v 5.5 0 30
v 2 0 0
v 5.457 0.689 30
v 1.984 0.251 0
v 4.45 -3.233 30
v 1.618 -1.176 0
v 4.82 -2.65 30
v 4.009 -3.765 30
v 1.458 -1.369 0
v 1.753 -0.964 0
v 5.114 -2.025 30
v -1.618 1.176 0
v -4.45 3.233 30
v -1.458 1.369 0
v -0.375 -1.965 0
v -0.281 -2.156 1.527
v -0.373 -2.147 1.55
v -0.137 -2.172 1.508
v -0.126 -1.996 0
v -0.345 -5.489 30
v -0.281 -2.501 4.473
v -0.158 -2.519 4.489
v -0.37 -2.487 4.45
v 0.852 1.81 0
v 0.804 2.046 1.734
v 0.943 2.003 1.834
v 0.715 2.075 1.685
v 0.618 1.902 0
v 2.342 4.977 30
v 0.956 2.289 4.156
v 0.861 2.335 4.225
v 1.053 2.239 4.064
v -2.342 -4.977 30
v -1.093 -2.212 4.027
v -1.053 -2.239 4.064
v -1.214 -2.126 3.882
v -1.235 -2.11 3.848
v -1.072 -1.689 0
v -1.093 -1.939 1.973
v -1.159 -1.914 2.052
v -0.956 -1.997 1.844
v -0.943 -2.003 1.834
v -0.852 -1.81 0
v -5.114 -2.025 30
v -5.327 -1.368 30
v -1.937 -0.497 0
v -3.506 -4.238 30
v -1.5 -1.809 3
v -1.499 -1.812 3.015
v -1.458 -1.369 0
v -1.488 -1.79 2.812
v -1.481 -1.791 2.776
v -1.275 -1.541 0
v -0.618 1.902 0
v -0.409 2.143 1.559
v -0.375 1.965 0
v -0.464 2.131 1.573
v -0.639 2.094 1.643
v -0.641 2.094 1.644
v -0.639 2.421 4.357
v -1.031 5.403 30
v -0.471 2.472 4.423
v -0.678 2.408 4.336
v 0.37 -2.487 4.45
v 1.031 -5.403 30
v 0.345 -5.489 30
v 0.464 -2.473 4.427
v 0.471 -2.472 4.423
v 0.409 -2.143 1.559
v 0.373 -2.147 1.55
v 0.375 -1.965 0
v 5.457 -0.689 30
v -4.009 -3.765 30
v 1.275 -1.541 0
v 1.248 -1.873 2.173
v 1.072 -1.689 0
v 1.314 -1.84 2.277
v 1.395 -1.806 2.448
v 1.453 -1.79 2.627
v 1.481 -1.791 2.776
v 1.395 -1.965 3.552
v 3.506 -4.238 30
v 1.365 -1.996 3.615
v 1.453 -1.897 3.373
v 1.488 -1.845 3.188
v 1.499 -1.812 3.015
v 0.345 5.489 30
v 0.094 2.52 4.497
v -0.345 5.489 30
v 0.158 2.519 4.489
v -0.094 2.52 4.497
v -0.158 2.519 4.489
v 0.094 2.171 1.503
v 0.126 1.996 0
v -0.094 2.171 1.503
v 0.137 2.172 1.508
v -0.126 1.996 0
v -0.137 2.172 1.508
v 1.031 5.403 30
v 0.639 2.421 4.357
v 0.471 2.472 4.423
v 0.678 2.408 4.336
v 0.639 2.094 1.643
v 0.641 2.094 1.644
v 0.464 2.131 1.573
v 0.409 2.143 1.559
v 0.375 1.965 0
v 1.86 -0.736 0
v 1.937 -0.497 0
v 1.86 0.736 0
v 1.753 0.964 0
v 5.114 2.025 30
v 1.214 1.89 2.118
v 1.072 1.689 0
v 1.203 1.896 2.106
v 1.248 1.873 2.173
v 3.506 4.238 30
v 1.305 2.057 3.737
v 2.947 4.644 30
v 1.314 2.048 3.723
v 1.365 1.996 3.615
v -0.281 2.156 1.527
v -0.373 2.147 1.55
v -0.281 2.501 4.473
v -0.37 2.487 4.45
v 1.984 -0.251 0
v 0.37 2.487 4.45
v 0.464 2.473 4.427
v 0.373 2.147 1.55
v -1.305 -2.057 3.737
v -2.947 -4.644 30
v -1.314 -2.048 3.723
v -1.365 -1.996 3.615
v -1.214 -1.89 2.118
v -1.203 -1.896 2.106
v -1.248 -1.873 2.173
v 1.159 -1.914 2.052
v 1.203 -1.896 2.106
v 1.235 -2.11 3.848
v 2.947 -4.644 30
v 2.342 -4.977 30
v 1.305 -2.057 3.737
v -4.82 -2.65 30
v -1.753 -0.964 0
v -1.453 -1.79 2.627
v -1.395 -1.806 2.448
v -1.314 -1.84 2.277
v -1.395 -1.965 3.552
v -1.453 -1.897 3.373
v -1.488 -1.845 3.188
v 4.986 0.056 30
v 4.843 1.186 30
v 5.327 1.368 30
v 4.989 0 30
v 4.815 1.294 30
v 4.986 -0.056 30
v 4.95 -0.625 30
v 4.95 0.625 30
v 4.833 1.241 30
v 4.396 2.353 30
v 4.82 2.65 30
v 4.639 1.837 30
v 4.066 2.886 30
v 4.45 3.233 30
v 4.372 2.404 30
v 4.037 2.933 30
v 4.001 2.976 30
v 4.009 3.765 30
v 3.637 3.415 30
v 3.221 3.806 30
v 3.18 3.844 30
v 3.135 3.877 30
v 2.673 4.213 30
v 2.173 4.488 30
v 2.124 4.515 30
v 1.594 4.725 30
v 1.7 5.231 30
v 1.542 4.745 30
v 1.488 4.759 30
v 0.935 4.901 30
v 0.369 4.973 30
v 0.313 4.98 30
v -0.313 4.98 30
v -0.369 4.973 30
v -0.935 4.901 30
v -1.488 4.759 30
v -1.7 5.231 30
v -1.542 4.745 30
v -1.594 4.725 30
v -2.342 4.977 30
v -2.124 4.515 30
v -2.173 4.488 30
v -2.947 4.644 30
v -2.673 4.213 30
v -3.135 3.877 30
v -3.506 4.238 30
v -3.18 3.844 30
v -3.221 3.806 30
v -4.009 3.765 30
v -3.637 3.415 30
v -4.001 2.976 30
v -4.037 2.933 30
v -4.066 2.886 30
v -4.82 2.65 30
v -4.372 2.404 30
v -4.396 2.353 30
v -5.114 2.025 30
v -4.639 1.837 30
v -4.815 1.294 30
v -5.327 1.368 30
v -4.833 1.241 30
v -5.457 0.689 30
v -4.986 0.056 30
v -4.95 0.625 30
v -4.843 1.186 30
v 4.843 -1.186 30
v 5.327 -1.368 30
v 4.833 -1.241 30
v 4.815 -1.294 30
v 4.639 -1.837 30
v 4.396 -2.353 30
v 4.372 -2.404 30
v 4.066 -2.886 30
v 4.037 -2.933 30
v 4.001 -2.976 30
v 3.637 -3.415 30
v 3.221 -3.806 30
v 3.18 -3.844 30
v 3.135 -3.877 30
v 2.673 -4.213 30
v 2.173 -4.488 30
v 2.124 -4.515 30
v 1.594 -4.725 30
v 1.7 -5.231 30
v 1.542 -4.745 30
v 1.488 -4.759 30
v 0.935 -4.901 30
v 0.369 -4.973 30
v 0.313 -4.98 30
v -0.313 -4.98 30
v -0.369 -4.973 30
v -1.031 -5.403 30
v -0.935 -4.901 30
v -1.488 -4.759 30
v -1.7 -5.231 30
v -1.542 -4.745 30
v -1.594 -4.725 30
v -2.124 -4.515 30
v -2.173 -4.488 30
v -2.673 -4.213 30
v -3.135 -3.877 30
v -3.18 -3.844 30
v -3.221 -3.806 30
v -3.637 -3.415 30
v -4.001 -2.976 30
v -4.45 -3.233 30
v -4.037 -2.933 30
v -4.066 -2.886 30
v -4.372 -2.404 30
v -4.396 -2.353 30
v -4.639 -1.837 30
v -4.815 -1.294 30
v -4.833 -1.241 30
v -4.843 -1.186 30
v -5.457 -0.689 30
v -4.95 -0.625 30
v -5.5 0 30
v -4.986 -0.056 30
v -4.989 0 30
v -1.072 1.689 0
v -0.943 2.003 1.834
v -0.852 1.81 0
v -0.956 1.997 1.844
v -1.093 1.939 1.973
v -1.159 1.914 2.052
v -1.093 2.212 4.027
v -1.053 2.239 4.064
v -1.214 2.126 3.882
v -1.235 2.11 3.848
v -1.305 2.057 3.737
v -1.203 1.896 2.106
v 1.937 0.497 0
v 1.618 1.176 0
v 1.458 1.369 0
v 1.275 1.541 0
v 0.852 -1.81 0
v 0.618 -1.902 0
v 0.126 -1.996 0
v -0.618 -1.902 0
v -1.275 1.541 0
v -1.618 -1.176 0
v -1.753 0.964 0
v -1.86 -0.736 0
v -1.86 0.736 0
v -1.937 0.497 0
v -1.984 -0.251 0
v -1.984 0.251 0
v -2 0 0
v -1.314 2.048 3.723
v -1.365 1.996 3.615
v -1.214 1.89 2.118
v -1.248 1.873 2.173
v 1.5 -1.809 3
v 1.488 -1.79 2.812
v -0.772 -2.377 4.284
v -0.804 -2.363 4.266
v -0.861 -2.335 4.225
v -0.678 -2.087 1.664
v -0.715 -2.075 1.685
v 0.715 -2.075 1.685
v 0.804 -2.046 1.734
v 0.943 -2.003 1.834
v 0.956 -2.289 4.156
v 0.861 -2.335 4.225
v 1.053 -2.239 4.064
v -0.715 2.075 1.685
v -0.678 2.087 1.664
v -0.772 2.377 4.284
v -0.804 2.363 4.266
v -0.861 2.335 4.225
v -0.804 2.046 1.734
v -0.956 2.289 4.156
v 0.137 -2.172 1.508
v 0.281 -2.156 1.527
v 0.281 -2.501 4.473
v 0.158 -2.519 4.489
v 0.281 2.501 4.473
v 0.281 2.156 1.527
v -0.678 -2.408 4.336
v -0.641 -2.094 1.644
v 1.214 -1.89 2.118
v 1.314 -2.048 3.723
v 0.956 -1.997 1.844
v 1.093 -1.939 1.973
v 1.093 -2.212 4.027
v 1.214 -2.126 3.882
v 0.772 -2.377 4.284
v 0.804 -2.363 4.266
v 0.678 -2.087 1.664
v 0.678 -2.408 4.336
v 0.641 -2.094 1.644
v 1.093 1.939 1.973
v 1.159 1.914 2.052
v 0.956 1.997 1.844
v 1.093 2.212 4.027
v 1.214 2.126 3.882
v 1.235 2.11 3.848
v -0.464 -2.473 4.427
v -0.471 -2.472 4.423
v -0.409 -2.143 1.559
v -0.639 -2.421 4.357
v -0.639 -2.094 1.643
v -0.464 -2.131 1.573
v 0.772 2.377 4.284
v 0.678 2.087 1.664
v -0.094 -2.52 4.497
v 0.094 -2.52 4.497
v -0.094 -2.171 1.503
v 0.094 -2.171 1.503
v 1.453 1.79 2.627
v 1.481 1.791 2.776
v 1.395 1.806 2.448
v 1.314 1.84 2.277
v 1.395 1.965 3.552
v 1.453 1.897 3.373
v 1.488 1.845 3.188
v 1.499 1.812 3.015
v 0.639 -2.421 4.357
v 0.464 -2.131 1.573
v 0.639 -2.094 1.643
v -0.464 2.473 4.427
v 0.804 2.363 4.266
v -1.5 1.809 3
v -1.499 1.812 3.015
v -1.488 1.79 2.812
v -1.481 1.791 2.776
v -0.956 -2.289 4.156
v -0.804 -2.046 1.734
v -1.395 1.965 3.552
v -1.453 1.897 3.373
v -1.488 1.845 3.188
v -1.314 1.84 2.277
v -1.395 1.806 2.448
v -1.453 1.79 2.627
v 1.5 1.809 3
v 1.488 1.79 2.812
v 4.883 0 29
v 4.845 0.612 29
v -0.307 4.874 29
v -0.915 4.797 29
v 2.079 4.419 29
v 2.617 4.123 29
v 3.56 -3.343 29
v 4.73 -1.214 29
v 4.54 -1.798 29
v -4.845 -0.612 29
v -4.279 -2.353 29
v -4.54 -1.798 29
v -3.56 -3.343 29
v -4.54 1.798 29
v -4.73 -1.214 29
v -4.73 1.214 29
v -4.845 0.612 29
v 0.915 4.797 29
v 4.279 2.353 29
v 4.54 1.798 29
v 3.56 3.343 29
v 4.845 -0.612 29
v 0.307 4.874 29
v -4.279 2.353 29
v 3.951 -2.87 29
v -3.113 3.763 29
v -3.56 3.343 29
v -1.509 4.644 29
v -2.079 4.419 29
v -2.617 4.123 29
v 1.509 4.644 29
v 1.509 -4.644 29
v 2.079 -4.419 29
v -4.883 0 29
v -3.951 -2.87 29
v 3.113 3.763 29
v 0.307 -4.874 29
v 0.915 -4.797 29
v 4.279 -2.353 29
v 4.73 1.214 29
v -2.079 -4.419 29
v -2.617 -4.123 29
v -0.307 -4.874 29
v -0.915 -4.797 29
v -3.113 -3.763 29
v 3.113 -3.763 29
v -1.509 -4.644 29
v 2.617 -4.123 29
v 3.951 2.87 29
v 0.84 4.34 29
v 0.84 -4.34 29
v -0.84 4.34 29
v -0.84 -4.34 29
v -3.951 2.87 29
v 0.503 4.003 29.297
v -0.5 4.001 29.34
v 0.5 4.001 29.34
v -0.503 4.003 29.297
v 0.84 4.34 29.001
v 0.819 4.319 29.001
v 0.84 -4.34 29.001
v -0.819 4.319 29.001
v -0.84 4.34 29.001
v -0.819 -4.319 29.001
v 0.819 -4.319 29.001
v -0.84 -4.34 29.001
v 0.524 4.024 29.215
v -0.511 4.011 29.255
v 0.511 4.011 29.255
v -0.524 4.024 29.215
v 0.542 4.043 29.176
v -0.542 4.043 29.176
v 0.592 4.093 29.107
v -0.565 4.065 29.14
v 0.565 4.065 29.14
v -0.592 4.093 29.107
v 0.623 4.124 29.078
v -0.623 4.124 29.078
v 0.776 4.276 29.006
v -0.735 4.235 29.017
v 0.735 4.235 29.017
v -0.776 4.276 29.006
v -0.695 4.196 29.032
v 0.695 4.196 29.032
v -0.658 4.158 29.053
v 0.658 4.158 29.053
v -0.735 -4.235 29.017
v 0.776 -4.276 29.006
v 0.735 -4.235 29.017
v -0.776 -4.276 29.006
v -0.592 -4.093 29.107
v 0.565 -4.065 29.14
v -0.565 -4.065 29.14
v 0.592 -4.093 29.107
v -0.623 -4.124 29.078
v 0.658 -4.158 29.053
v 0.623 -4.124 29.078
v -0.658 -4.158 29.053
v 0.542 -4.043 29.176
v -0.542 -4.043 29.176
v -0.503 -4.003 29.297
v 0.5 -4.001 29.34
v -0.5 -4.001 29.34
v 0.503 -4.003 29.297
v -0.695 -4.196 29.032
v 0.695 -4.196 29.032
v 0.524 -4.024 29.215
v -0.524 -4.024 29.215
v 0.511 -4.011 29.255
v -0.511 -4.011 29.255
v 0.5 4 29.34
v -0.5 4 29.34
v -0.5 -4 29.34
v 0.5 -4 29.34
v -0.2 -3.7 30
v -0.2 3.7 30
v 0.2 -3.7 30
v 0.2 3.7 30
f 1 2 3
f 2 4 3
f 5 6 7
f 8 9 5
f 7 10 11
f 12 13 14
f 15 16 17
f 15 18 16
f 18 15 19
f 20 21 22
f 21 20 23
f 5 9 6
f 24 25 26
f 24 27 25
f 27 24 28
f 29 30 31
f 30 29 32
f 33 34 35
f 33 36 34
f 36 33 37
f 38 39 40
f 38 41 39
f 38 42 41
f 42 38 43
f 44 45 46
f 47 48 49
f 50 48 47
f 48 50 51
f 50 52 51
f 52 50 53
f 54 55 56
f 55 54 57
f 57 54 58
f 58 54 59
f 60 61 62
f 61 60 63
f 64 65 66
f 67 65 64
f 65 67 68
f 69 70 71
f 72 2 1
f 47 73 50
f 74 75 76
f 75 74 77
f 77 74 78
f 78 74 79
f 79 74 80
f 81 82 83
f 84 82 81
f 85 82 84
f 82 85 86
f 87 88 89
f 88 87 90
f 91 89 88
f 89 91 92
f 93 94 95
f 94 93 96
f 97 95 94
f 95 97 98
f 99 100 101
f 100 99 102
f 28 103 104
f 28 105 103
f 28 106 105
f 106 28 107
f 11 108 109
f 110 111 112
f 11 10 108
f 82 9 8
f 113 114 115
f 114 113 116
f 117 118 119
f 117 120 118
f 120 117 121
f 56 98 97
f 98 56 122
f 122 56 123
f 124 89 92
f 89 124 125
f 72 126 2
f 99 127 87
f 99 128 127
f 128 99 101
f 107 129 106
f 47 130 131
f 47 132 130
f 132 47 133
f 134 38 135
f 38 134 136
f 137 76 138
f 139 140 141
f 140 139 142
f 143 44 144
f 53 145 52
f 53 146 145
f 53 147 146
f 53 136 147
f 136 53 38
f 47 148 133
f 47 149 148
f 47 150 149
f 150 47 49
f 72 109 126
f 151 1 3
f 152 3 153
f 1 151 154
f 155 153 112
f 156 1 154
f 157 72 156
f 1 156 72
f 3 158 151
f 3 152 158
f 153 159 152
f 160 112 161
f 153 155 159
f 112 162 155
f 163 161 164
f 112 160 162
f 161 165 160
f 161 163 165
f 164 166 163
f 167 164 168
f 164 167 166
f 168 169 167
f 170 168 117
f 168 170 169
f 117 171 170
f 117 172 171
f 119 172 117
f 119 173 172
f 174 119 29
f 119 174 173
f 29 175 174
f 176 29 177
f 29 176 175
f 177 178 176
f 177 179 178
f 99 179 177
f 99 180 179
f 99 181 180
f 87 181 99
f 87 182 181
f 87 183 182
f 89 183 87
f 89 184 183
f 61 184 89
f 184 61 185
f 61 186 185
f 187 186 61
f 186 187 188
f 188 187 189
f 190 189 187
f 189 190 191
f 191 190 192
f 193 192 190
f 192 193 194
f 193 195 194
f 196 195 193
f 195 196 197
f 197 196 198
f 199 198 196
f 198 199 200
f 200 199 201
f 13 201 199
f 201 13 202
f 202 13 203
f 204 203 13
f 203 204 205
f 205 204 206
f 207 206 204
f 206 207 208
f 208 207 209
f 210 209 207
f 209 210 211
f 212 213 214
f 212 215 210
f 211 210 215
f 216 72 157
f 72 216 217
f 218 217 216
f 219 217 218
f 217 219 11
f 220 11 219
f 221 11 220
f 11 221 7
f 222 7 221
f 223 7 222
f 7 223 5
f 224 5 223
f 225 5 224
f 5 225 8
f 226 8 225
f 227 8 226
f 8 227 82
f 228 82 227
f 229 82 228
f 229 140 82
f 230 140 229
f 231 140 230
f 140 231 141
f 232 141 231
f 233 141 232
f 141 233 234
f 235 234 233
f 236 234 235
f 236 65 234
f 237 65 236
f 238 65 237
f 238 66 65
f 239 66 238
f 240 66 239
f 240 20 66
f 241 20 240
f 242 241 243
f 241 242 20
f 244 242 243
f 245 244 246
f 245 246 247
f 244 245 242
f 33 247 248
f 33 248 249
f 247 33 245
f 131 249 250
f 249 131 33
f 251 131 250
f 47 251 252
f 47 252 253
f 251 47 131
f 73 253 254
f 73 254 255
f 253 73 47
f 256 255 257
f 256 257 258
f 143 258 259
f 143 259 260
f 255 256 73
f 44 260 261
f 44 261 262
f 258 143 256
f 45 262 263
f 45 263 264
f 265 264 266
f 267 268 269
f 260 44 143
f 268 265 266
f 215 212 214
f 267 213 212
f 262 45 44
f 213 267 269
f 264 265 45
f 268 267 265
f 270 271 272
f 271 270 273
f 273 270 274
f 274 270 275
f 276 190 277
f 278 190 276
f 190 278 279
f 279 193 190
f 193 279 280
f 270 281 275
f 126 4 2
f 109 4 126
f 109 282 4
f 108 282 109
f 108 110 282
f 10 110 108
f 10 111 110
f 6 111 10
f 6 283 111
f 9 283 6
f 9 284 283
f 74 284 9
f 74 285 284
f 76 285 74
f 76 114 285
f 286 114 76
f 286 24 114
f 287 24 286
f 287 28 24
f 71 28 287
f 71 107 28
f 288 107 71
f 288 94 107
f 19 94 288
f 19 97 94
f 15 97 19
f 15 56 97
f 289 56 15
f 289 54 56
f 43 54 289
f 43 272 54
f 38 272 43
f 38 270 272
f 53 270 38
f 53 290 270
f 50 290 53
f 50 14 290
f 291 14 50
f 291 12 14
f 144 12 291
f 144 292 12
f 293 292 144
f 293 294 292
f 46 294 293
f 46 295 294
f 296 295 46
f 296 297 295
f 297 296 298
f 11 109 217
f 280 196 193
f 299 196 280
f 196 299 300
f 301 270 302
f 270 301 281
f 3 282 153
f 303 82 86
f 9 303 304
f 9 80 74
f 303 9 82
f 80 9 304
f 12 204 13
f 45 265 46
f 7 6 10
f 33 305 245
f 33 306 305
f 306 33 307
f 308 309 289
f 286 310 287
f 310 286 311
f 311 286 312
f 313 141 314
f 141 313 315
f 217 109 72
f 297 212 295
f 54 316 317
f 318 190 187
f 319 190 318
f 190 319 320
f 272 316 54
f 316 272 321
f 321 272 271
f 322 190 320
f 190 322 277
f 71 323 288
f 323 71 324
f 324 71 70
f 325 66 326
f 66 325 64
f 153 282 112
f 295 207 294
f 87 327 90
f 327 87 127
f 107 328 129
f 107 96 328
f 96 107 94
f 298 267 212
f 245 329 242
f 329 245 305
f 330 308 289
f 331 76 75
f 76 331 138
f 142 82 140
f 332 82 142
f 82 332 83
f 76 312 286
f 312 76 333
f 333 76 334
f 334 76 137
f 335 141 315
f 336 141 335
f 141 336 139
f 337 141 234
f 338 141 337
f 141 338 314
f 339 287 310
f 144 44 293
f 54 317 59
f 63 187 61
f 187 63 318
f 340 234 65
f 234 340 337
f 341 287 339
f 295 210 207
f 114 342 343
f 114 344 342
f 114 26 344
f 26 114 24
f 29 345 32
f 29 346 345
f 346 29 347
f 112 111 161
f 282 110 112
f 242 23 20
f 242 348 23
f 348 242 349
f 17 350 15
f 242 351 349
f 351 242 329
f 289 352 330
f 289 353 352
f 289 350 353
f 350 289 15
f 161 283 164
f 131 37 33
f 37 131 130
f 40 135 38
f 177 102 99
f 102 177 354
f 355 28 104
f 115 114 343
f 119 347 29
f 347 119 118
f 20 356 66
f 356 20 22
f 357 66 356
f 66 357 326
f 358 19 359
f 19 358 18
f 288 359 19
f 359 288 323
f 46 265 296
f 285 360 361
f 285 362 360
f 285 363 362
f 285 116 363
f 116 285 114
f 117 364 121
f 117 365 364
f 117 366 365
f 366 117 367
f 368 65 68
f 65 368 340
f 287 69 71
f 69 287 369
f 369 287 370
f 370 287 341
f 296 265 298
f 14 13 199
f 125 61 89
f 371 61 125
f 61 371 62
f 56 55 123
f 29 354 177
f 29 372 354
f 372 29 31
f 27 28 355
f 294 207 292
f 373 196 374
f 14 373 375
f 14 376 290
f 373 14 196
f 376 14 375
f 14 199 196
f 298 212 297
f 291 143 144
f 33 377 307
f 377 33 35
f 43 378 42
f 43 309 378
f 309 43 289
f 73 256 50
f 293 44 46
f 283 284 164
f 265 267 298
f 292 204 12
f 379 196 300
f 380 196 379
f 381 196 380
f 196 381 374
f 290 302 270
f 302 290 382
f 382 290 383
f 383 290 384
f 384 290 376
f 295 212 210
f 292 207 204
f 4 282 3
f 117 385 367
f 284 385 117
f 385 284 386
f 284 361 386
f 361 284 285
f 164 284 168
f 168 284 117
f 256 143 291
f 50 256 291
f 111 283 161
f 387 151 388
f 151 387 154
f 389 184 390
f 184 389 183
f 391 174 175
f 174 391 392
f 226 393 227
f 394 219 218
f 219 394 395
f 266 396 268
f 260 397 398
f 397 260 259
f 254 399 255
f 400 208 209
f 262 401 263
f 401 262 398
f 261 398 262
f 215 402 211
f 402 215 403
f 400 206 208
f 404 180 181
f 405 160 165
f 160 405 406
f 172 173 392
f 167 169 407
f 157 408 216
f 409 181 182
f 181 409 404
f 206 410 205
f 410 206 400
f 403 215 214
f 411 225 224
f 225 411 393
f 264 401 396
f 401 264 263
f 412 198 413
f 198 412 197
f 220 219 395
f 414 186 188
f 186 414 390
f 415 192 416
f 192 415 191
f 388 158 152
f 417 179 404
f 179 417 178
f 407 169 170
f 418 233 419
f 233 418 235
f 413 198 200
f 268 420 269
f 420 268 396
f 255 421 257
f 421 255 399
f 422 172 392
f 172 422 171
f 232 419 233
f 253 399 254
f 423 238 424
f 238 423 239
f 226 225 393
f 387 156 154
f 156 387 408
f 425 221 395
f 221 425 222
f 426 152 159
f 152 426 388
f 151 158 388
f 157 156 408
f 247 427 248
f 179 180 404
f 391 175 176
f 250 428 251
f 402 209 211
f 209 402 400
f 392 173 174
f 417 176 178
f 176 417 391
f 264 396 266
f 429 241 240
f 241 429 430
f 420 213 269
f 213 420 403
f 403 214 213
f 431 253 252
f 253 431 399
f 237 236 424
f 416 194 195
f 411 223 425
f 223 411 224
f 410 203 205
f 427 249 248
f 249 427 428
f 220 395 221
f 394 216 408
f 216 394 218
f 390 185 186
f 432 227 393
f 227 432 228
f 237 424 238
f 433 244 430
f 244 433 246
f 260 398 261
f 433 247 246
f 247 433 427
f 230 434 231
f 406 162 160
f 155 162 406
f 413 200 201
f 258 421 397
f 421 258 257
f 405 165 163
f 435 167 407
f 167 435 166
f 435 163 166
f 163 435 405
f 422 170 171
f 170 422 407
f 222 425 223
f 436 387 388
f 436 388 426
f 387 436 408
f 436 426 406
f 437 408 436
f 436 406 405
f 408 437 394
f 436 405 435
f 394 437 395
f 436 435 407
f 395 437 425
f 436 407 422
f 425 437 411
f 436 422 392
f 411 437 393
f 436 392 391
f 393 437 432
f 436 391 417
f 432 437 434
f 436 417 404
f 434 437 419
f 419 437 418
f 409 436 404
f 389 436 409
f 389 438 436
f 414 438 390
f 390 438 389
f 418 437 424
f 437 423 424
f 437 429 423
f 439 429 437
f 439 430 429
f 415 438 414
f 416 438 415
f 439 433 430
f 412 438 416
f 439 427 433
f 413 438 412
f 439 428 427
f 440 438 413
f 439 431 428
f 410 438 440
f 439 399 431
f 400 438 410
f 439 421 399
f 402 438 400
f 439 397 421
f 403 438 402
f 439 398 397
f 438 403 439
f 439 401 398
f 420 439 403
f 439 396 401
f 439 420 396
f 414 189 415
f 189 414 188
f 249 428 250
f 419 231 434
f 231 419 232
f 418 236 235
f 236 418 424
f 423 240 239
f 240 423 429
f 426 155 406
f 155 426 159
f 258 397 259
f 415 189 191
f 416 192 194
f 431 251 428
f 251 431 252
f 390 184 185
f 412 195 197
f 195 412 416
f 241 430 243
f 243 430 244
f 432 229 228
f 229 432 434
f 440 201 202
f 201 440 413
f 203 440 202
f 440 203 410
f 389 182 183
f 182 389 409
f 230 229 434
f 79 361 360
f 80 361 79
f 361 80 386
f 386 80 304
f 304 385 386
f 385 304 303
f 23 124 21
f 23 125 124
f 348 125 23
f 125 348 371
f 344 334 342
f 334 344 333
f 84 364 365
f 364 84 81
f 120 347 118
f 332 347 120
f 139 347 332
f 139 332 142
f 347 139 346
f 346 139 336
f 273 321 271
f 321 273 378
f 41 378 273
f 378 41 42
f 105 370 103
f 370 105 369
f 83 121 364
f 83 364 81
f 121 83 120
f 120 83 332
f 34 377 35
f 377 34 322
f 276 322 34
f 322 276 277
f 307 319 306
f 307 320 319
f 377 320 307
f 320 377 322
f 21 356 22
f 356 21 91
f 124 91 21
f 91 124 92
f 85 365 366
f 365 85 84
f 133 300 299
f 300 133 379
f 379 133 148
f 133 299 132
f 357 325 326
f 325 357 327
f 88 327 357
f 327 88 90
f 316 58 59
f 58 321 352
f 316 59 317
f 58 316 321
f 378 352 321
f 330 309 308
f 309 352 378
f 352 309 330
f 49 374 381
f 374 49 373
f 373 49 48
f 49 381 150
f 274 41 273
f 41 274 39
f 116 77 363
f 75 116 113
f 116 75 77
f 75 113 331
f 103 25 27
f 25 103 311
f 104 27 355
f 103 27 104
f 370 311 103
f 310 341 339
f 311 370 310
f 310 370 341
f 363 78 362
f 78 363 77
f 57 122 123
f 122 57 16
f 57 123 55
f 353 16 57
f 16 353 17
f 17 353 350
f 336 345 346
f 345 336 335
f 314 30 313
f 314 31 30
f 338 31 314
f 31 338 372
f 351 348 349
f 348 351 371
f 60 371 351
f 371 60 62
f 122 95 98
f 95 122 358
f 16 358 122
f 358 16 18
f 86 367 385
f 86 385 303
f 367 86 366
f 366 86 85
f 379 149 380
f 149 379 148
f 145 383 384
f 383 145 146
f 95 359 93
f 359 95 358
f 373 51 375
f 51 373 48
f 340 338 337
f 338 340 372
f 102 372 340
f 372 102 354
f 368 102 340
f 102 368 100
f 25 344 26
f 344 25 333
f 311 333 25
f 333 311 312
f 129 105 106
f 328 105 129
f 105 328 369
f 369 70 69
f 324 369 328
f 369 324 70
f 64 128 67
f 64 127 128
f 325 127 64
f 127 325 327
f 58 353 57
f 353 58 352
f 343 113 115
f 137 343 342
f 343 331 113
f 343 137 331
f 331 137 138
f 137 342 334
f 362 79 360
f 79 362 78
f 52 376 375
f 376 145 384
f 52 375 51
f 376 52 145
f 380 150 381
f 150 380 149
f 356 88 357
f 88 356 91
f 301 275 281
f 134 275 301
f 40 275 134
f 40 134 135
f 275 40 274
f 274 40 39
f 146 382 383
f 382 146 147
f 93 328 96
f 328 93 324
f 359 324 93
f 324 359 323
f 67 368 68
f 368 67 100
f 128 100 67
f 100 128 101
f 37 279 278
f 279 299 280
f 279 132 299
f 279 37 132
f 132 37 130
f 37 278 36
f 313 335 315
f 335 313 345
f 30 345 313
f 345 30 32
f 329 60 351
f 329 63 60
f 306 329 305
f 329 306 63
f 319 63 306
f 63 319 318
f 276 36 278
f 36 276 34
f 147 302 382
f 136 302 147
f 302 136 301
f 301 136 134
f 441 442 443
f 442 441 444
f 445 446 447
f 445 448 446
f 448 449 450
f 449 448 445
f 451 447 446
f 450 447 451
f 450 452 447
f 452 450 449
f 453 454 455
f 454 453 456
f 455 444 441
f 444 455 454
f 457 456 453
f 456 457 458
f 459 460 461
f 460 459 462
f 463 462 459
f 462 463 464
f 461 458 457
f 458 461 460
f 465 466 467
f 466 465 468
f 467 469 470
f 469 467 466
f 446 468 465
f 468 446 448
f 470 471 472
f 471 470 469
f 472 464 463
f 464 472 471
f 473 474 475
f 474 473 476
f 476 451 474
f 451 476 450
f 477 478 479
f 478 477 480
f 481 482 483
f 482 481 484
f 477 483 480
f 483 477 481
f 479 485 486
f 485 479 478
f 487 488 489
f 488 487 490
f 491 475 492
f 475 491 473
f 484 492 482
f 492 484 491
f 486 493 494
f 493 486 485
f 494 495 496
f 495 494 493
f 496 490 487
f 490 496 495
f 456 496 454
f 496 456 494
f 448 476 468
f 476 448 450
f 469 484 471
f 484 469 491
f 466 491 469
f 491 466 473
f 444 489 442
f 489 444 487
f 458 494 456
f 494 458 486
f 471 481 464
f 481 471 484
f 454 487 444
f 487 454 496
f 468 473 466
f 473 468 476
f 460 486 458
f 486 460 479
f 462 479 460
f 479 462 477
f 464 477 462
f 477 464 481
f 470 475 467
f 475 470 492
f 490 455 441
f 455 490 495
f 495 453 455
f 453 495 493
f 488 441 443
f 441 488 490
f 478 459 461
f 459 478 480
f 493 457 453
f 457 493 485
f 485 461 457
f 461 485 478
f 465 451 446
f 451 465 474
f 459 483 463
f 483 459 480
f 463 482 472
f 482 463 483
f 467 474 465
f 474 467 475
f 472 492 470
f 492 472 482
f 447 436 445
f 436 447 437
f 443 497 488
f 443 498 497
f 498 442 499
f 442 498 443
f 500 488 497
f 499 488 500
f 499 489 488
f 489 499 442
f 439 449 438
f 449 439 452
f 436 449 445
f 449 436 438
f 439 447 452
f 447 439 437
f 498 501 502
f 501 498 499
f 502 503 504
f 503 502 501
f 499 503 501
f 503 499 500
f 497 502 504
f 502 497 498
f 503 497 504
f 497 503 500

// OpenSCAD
//  The amount of edges in every circle
$fn = 50;

//  The outer radius of the cylinder
Ro = 5.5;

//  The inner radius of the cylinder
Ri = 5;

//  The bottom outer radius, the whole thing will be scaled to this
Rb = 2;

//  The height of the cylinder
H = 30;

//  The depth of the cut out for the driver
depth = 1;

//  The height of the tapering part of the top of the driver
tapered = 0.66;

//  The decrease in dimension of the top part
decrease = 0.3;

//  The radius of the fillet at the bottom of the driver
fillet = 0.34;

//  The width of the base of the driver, must be smaller than 2 * Ri
driverBaseWidth = 1;

//  The length of the base of the driver, must be smaller than 2 * Ri
driverBaseLength = 8;

//  The height of the keychain hole
keyChainHeight = 3;

//  The radius of the keychain hole
keyChainRadius = 1.5;

module keyChainIdleScrewDriver(){
    delta = 0.0001;
    union(){
        difference(){
            cylinder(r1 = Rb, r2 = Ro, h = H);
            translate([0,0,H - depth]){
                cylinder(r1 = (Ro - Rb) / H * (H - depth) + Rb - Ro + Ri, r2 = Ri, h = depth + 0.1);
            }
            translate([0, -Ro - 0.1, keyChainHeight]){
                rotate([-90,0,0]){
                    cylinder(r = keyChainRadius, h = 2 * Ro + 0.2);
                }
            }
        }        
        translate([0,0,H - depth]){
            union(){
                difference(){
                    cube([driverBaseWidth + 2 * fillet, driverBaseLength + 2 * fillet, 2 * fillet], center = true);
                    translate([0,0, 2 * fillet]){
                        minkowski(){
                            difference(){
                                cube([driverBaseWidth + 4 * fillet, driverBaseLength + 4 * fillet, 2 * fillet], center = true);
                                cube([driverBaseWidth + 2 * fillet, driverBaseLength + 2 * fillet, 2 * fillet], center = true);
                            }
                            sphere(r = fillet);
                        }
                    }
                }
                translate([-driverBaseWidth / 2, -driverBaseLength / 2, 0]){
                        cube([driverBaseWidth, driverBaseLength, depth - tapered]);
                }
                translate([-driverBaseWidth / 2, -driverBaseLength / 2, depth - tapered]){
                    hull(){
                        cube([driverBaseWidth, driverBaseLength, delta]);
                        translate([decrease, decrease, tapered]){
                            cube([driverBaseWidth - 2 * decrease, driverBaseLength - 2 * decrease, delta]);
                        }
                    }
                }
            }
        }
    }
}

keyChainIdleScrewDriver();


        
        
